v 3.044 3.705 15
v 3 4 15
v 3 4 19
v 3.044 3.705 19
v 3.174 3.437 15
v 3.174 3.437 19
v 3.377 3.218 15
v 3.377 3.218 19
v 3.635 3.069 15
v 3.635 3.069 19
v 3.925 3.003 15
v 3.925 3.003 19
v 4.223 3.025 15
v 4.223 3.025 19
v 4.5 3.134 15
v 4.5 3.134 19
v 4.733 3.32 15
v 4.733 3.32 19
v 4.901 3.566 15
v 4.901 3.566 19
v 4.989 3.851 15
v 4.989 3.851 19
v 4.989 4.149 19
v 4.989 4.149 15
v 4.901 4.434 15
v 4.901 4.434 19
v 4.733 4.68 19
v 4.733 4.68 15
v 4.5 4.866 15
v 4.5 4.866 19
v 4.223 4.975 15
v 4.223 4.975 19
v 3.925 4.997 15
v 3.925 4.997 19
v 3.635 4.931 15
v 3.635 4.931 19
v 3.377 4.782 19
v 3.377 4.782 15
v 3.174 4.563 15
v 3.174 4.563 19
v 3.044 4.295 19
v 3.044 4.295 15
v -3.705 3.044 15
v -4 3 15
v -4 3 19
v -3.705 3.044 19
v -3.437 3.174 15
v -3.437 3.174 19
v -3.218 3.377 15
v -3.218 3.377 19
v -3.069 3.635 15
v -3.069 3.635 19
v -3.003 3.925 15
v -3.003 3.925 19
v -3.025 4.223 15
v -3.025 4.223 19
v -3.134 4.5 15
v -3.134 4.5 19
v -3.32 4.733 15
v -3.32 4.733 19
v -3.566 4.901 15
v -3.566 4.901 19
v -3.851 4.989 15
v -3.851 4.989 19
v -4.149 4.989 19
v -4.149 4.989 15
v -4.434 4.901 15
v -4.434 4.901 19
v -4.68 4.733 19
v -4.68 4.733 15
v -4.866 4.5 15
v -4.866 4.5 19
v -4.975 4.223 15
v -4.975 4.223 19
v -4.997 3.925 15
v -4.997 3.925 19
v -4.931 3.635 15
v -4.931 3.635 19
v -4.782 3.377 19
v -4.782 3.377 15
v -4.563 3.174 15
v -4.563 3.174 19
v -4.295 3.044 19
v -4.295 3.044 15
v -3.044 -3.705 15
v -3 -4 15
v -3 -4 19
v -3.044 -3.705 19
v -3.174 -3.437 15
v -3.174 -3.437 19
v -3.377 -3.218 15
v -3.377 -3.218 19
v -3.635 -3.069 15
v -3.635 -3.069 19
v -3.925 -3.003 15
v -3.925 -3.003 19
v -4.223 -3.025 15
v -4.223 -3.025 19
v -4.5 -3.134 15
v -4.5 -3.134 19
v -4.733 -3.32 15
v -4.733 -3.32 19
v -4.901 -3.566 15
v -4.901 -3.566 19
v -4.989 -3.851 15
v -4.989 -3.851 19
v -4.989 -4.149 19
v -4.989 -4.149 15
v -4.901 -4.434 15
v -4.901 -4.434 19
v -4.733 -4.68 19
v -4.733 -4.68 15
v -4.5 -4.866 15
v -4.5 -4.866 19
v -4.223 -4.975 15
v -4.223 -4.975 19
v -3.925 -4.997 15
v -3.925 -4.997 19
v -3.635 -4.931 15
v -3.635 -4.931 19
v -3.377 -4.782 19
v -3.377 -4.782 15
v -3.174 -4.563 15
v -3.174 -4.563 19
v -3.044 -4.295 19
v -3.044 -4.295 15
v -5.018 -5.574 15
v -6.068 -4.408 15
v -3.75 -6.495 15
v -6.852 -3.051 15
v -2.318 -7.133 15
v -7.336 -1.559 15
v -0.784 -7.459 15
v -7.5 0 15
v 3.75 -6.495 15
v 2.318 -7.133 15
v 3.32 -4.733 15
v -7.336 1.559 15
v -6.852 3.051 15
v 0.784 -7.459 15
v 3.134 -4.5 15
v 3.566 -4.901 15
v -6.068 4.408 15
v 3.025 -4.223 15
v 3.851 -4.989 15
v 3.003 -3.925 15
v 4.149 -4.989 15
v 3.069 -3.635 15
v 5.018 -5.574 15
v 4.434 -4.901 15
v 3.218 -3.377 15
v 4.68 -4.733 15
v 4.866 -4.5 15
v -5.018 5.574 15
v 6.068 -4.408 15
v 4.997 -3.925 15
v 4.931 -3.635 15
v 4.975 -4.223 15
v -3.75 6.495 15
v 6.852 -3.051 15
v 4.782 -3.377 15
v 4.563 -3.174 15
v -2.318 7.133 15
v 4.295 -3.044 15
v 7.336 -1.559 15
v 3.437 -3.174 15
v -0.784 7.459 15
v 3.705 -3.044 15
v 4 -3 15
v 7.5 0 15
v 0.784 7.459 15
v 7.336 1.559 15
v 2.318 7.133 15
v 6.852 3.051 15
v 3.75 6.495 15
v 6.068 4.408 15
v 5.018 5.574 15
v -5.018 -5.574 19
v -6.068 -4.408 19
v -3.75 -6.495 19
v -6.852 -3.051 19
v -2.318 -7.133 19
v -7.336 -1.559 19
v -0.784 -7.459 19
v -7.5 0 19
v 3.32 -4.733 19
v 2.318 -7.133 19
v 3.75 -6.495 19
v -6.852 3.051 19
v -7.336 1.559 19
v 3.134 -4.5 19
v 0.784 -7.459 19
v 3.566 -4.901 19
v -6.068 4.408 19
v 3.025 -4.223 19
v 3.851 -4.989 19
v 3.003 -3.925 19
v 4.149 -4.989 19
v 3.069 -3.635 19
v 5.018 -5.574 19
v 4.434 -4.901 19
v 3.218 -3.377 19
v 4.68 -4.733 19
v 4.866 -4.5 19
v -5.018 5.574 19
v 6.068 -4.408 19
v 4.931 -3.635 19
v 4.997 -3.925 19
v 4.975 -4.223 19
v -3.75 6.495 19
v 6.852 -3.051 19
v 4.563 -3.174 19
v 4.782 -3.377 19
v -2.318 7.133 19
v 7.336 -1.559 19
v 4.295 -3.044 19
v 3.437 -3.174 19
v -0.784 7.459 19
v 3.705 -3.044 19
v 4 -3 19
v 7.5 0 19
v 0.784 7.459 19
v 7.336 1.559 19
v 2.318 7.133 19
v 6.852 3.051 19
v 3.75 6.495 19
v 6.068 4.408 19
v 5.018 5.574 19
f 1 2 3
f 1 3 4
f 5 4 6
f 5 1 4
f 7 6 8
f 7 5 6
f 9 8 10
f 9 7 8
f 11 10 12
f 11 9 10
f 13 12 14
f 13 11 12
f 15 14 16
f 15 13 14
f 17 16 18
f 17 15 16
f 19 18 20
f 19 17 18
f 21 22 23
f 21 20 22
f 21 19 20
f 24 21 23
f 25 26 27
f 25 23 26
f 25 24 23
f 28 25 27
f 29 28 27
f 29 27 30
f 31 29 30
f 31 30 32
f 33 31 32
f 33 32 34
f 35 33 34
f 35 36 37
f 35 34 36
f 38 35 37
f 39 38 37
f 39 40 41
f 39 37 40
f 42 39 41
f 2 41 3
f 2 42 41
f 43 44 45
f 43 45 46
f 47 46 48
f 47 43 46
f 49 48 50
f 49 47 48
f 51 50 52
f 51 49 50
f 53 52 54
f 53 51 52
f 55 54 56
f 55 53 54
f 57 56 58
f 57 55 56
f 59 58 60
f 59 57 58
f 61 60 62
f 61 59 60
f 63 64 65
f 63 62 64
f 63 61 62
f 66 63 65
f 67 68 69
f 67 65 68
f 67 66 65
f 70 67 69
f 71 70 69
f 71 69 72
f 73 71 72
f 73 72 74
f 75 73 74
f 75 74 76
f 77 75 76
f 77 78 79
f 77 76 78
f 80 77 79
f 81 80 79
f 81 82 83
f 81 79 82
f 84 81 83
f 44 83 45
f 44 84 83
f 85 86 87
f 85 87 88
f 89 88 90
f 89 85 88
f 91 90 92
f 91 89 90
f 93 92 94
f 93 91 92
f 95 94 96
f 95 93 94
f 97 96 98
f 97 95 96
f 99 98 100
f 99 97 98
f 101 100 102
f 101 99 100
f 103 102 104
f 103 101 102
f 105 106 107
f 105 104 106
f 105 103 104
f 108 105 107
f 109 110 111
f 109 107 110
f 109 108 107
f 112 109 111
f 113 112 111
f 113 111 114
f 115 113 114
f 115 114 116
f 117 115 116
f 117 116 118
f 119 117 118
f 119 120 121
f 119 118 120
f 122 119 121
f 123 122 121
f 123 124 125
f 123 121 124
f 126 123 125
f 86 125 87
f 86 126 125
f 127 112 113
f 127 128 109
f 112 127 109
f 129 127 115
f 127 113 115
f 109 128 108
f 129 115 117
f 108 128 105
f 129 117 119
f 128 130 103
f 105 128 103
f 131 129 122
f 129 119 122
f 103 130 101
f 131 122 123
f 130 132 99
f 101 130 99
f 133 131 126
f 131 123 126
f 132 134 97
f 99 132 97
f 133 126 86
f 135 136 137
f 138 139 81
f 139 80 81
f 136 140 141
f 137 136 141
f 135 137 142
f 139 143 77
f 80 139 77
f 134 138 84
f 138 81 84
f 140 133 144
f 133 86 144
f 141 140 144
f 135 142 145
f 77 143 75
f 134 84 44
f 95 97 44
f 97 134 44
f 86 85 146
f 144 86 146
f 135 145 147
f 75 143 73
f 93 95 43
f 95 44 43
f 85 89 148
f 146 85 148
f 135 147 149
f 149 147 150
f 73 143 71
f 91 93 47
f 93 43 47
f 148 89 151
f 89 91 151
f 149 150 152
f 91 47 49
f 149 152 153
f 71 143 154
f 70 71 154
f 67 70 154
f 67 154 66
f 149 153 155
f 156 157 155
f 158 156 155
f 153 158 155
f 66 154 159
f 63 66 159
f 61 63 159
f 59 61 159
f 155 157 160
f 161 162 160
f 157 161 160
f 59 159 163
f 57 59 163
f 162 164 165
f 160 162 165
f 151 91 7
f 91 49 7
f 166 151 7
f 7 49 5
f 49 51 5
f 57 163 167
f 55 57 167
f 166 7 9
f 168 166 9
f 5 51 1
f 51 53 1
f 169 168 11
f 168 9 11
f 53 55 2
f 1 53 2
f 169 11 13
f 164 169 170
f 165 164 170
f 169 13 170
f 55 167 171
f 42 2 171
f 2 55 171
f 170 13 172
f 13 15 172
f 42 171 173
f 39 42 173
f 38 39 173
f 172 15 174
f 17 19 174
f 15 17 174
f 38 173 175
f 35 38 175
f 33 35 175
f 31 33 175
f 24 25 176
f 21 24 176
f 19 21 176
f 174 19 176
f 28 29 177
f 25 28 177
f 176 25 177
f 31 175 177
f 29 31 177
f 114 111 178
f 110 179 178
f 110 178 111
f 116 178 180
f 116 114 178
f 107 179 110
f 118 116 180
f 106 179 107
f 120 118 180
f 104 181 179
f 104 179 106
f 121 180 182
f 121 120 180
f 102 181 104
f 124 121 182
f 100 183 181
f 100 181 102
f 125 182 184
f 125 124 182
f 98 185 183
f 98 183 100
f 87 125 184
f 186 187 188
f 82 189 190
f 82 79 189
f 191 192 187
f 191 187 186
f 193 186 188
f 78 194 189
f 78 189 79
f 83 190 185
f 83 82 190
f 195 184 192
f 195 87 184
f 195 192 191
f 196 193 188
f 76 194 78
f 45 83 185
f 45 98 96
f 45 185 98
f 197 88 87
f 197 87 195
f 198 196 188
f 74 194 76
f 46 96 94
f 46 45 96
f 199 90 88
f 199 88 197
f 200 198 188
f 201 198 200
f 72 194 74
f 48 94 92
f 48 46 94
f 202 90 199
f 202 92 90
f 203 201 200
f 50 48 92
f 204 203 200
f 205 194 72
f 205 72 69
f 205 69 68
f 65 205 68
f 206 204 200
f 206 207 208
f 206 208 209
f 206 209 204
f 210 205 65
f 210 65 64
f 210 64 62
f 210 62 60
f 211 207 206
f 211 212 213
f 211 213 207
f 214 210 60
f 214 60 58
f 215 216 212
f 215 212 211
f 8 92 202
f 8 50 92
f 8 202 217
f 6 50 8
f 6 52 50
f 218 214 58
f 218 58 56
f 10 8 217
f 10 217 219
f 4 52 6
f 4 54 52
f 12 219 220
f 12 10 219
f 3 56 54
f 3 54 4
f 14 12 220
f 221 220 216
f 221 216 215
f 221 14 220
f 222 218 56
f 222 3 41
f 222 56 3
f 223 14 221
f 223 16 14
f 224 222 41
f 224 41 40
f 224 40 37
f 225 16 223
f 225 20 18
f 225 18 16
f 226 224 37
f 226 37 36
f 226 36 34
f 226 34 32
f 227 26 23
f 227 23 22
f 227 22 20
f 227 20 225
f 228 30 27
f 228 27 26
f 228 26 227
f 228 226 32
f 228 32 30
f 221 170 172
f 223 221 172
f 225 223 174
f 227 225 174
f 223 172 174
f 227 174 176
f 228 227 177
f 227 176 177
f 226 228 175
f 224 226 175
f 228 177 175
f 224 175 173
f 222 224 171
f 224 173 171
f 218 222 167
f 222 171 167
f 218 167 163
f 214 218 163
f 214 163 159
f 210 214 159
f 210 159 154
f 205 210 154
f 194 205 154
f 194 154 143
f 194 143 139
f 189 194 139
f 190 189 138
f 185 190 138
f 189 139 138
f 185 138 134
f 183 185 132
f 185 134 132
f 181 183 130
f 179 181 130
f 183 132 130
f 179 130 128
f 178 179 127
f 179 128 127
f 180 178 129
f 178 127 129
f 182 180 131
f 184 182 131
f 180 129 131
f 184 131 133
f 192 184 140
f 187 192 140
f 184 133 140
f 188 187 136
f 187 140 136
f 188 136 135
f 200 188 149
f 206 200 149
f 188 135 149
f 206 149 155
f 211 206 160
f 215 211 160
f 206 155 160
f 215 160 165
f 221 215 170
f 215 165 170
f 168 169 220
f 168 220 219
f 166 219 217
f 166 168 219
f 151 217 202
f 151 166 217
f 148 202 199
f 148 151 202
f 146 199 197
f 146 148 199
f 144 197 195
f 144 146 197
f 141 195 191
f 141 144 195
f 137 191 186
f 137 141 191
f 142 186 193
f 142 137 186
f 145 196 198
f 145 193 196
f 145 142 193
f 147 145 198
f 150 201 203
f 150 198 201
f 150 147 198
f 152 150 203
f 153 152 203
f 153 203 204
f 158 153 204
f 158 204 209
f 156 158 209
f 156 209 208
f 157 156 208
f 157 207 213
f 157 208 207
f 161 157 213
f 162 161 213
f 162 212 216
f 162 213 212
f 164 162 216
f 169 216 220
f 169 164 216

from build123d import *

# Parameters (mm, degrees)
CYLINDER1384_R     = 1
CYLINDER1384_DEPTH = 20
CYLINDER1389_R     = 1
CYLINDER1389_DEPTH = 20
CYLINDER1379_R     = 1
CYLINDER1379_DEPTH = 20
CYLINDER1391_R     = 1
CYLINDER1391_DEPTH = 20
CYLINDER1376_R     = 7.5
CYLINDER1376_DEPTH = 4


with BuildPart() as v_lec1384:
    # Cylinder1384 → Cylinder1384 (new body)
    with BuildSketch(Plane(origin=(4, -4, -88), x_dir=(0, 1, 0), z_dir=(0, 0, 1))):
        Circle(CYLINDER1384_R)
    extrude(amount=CYLINDER1384_DEPTH)


with BuildPart() as v_lec1389:
    # Cylinder1389 → Cylinder1389 (new body)
    with BuildSketch(Plane(origin=(4, 4, -88), x_dir=(-1, 0, 0), z_dir=(0, 0, 1))):
        Circle(CYLINDER1389_R)
    extrude(amount=CYLINDER1389_DEPTH)


with BuildPart() as v_lec1379:
    # Cylinder1379 → Cylinder1379 (new body)
    with BuildSketch(Plane(origin=(-4, 4, -88), x_dir=(0, -1, 0), z_dir=(0, 0, 1))):
        Circle(CYLINDER1379_R)
    extrude(amount=CYLINDER1379_DEPTH)


with BuildPart() as compound959:
    # Cylinder1391 → Cylinder1391 (new body)
    with BuildSketch(Plane(origin=(-4, -4, -88), x_dir=(1, 0, 0), z_dir=(0, 0, 1))):
        Circle(CYLINDER1391_R)
    extrude(amount=CYLINDER1391_DEPTH)

    # Compound959: union Válec1384, Válec1389, Válec1379
    add(v_lec1384.part)
    add(v_lec1389.part)
    add(v_lec1379.part)


with BuildPart() as compound959_1:
    # Compound959 placement: moved
    add(compound959.part.moved(Location((0, 0, 91))))


with BuildPart() as cut499:
    # Cylinder1376 → Cylinder1376 (new body)
    with BuildSketch(Plane.XY.offset(15)):
        Circle(CYLINDER1376_R)
    extrude(amount=CYLINDER1376_DEPTH)

    # Cut499: cut Compound959
    add(compound959_1.part, mode=Mode.SUBTRACT)


solid = cut499.part
